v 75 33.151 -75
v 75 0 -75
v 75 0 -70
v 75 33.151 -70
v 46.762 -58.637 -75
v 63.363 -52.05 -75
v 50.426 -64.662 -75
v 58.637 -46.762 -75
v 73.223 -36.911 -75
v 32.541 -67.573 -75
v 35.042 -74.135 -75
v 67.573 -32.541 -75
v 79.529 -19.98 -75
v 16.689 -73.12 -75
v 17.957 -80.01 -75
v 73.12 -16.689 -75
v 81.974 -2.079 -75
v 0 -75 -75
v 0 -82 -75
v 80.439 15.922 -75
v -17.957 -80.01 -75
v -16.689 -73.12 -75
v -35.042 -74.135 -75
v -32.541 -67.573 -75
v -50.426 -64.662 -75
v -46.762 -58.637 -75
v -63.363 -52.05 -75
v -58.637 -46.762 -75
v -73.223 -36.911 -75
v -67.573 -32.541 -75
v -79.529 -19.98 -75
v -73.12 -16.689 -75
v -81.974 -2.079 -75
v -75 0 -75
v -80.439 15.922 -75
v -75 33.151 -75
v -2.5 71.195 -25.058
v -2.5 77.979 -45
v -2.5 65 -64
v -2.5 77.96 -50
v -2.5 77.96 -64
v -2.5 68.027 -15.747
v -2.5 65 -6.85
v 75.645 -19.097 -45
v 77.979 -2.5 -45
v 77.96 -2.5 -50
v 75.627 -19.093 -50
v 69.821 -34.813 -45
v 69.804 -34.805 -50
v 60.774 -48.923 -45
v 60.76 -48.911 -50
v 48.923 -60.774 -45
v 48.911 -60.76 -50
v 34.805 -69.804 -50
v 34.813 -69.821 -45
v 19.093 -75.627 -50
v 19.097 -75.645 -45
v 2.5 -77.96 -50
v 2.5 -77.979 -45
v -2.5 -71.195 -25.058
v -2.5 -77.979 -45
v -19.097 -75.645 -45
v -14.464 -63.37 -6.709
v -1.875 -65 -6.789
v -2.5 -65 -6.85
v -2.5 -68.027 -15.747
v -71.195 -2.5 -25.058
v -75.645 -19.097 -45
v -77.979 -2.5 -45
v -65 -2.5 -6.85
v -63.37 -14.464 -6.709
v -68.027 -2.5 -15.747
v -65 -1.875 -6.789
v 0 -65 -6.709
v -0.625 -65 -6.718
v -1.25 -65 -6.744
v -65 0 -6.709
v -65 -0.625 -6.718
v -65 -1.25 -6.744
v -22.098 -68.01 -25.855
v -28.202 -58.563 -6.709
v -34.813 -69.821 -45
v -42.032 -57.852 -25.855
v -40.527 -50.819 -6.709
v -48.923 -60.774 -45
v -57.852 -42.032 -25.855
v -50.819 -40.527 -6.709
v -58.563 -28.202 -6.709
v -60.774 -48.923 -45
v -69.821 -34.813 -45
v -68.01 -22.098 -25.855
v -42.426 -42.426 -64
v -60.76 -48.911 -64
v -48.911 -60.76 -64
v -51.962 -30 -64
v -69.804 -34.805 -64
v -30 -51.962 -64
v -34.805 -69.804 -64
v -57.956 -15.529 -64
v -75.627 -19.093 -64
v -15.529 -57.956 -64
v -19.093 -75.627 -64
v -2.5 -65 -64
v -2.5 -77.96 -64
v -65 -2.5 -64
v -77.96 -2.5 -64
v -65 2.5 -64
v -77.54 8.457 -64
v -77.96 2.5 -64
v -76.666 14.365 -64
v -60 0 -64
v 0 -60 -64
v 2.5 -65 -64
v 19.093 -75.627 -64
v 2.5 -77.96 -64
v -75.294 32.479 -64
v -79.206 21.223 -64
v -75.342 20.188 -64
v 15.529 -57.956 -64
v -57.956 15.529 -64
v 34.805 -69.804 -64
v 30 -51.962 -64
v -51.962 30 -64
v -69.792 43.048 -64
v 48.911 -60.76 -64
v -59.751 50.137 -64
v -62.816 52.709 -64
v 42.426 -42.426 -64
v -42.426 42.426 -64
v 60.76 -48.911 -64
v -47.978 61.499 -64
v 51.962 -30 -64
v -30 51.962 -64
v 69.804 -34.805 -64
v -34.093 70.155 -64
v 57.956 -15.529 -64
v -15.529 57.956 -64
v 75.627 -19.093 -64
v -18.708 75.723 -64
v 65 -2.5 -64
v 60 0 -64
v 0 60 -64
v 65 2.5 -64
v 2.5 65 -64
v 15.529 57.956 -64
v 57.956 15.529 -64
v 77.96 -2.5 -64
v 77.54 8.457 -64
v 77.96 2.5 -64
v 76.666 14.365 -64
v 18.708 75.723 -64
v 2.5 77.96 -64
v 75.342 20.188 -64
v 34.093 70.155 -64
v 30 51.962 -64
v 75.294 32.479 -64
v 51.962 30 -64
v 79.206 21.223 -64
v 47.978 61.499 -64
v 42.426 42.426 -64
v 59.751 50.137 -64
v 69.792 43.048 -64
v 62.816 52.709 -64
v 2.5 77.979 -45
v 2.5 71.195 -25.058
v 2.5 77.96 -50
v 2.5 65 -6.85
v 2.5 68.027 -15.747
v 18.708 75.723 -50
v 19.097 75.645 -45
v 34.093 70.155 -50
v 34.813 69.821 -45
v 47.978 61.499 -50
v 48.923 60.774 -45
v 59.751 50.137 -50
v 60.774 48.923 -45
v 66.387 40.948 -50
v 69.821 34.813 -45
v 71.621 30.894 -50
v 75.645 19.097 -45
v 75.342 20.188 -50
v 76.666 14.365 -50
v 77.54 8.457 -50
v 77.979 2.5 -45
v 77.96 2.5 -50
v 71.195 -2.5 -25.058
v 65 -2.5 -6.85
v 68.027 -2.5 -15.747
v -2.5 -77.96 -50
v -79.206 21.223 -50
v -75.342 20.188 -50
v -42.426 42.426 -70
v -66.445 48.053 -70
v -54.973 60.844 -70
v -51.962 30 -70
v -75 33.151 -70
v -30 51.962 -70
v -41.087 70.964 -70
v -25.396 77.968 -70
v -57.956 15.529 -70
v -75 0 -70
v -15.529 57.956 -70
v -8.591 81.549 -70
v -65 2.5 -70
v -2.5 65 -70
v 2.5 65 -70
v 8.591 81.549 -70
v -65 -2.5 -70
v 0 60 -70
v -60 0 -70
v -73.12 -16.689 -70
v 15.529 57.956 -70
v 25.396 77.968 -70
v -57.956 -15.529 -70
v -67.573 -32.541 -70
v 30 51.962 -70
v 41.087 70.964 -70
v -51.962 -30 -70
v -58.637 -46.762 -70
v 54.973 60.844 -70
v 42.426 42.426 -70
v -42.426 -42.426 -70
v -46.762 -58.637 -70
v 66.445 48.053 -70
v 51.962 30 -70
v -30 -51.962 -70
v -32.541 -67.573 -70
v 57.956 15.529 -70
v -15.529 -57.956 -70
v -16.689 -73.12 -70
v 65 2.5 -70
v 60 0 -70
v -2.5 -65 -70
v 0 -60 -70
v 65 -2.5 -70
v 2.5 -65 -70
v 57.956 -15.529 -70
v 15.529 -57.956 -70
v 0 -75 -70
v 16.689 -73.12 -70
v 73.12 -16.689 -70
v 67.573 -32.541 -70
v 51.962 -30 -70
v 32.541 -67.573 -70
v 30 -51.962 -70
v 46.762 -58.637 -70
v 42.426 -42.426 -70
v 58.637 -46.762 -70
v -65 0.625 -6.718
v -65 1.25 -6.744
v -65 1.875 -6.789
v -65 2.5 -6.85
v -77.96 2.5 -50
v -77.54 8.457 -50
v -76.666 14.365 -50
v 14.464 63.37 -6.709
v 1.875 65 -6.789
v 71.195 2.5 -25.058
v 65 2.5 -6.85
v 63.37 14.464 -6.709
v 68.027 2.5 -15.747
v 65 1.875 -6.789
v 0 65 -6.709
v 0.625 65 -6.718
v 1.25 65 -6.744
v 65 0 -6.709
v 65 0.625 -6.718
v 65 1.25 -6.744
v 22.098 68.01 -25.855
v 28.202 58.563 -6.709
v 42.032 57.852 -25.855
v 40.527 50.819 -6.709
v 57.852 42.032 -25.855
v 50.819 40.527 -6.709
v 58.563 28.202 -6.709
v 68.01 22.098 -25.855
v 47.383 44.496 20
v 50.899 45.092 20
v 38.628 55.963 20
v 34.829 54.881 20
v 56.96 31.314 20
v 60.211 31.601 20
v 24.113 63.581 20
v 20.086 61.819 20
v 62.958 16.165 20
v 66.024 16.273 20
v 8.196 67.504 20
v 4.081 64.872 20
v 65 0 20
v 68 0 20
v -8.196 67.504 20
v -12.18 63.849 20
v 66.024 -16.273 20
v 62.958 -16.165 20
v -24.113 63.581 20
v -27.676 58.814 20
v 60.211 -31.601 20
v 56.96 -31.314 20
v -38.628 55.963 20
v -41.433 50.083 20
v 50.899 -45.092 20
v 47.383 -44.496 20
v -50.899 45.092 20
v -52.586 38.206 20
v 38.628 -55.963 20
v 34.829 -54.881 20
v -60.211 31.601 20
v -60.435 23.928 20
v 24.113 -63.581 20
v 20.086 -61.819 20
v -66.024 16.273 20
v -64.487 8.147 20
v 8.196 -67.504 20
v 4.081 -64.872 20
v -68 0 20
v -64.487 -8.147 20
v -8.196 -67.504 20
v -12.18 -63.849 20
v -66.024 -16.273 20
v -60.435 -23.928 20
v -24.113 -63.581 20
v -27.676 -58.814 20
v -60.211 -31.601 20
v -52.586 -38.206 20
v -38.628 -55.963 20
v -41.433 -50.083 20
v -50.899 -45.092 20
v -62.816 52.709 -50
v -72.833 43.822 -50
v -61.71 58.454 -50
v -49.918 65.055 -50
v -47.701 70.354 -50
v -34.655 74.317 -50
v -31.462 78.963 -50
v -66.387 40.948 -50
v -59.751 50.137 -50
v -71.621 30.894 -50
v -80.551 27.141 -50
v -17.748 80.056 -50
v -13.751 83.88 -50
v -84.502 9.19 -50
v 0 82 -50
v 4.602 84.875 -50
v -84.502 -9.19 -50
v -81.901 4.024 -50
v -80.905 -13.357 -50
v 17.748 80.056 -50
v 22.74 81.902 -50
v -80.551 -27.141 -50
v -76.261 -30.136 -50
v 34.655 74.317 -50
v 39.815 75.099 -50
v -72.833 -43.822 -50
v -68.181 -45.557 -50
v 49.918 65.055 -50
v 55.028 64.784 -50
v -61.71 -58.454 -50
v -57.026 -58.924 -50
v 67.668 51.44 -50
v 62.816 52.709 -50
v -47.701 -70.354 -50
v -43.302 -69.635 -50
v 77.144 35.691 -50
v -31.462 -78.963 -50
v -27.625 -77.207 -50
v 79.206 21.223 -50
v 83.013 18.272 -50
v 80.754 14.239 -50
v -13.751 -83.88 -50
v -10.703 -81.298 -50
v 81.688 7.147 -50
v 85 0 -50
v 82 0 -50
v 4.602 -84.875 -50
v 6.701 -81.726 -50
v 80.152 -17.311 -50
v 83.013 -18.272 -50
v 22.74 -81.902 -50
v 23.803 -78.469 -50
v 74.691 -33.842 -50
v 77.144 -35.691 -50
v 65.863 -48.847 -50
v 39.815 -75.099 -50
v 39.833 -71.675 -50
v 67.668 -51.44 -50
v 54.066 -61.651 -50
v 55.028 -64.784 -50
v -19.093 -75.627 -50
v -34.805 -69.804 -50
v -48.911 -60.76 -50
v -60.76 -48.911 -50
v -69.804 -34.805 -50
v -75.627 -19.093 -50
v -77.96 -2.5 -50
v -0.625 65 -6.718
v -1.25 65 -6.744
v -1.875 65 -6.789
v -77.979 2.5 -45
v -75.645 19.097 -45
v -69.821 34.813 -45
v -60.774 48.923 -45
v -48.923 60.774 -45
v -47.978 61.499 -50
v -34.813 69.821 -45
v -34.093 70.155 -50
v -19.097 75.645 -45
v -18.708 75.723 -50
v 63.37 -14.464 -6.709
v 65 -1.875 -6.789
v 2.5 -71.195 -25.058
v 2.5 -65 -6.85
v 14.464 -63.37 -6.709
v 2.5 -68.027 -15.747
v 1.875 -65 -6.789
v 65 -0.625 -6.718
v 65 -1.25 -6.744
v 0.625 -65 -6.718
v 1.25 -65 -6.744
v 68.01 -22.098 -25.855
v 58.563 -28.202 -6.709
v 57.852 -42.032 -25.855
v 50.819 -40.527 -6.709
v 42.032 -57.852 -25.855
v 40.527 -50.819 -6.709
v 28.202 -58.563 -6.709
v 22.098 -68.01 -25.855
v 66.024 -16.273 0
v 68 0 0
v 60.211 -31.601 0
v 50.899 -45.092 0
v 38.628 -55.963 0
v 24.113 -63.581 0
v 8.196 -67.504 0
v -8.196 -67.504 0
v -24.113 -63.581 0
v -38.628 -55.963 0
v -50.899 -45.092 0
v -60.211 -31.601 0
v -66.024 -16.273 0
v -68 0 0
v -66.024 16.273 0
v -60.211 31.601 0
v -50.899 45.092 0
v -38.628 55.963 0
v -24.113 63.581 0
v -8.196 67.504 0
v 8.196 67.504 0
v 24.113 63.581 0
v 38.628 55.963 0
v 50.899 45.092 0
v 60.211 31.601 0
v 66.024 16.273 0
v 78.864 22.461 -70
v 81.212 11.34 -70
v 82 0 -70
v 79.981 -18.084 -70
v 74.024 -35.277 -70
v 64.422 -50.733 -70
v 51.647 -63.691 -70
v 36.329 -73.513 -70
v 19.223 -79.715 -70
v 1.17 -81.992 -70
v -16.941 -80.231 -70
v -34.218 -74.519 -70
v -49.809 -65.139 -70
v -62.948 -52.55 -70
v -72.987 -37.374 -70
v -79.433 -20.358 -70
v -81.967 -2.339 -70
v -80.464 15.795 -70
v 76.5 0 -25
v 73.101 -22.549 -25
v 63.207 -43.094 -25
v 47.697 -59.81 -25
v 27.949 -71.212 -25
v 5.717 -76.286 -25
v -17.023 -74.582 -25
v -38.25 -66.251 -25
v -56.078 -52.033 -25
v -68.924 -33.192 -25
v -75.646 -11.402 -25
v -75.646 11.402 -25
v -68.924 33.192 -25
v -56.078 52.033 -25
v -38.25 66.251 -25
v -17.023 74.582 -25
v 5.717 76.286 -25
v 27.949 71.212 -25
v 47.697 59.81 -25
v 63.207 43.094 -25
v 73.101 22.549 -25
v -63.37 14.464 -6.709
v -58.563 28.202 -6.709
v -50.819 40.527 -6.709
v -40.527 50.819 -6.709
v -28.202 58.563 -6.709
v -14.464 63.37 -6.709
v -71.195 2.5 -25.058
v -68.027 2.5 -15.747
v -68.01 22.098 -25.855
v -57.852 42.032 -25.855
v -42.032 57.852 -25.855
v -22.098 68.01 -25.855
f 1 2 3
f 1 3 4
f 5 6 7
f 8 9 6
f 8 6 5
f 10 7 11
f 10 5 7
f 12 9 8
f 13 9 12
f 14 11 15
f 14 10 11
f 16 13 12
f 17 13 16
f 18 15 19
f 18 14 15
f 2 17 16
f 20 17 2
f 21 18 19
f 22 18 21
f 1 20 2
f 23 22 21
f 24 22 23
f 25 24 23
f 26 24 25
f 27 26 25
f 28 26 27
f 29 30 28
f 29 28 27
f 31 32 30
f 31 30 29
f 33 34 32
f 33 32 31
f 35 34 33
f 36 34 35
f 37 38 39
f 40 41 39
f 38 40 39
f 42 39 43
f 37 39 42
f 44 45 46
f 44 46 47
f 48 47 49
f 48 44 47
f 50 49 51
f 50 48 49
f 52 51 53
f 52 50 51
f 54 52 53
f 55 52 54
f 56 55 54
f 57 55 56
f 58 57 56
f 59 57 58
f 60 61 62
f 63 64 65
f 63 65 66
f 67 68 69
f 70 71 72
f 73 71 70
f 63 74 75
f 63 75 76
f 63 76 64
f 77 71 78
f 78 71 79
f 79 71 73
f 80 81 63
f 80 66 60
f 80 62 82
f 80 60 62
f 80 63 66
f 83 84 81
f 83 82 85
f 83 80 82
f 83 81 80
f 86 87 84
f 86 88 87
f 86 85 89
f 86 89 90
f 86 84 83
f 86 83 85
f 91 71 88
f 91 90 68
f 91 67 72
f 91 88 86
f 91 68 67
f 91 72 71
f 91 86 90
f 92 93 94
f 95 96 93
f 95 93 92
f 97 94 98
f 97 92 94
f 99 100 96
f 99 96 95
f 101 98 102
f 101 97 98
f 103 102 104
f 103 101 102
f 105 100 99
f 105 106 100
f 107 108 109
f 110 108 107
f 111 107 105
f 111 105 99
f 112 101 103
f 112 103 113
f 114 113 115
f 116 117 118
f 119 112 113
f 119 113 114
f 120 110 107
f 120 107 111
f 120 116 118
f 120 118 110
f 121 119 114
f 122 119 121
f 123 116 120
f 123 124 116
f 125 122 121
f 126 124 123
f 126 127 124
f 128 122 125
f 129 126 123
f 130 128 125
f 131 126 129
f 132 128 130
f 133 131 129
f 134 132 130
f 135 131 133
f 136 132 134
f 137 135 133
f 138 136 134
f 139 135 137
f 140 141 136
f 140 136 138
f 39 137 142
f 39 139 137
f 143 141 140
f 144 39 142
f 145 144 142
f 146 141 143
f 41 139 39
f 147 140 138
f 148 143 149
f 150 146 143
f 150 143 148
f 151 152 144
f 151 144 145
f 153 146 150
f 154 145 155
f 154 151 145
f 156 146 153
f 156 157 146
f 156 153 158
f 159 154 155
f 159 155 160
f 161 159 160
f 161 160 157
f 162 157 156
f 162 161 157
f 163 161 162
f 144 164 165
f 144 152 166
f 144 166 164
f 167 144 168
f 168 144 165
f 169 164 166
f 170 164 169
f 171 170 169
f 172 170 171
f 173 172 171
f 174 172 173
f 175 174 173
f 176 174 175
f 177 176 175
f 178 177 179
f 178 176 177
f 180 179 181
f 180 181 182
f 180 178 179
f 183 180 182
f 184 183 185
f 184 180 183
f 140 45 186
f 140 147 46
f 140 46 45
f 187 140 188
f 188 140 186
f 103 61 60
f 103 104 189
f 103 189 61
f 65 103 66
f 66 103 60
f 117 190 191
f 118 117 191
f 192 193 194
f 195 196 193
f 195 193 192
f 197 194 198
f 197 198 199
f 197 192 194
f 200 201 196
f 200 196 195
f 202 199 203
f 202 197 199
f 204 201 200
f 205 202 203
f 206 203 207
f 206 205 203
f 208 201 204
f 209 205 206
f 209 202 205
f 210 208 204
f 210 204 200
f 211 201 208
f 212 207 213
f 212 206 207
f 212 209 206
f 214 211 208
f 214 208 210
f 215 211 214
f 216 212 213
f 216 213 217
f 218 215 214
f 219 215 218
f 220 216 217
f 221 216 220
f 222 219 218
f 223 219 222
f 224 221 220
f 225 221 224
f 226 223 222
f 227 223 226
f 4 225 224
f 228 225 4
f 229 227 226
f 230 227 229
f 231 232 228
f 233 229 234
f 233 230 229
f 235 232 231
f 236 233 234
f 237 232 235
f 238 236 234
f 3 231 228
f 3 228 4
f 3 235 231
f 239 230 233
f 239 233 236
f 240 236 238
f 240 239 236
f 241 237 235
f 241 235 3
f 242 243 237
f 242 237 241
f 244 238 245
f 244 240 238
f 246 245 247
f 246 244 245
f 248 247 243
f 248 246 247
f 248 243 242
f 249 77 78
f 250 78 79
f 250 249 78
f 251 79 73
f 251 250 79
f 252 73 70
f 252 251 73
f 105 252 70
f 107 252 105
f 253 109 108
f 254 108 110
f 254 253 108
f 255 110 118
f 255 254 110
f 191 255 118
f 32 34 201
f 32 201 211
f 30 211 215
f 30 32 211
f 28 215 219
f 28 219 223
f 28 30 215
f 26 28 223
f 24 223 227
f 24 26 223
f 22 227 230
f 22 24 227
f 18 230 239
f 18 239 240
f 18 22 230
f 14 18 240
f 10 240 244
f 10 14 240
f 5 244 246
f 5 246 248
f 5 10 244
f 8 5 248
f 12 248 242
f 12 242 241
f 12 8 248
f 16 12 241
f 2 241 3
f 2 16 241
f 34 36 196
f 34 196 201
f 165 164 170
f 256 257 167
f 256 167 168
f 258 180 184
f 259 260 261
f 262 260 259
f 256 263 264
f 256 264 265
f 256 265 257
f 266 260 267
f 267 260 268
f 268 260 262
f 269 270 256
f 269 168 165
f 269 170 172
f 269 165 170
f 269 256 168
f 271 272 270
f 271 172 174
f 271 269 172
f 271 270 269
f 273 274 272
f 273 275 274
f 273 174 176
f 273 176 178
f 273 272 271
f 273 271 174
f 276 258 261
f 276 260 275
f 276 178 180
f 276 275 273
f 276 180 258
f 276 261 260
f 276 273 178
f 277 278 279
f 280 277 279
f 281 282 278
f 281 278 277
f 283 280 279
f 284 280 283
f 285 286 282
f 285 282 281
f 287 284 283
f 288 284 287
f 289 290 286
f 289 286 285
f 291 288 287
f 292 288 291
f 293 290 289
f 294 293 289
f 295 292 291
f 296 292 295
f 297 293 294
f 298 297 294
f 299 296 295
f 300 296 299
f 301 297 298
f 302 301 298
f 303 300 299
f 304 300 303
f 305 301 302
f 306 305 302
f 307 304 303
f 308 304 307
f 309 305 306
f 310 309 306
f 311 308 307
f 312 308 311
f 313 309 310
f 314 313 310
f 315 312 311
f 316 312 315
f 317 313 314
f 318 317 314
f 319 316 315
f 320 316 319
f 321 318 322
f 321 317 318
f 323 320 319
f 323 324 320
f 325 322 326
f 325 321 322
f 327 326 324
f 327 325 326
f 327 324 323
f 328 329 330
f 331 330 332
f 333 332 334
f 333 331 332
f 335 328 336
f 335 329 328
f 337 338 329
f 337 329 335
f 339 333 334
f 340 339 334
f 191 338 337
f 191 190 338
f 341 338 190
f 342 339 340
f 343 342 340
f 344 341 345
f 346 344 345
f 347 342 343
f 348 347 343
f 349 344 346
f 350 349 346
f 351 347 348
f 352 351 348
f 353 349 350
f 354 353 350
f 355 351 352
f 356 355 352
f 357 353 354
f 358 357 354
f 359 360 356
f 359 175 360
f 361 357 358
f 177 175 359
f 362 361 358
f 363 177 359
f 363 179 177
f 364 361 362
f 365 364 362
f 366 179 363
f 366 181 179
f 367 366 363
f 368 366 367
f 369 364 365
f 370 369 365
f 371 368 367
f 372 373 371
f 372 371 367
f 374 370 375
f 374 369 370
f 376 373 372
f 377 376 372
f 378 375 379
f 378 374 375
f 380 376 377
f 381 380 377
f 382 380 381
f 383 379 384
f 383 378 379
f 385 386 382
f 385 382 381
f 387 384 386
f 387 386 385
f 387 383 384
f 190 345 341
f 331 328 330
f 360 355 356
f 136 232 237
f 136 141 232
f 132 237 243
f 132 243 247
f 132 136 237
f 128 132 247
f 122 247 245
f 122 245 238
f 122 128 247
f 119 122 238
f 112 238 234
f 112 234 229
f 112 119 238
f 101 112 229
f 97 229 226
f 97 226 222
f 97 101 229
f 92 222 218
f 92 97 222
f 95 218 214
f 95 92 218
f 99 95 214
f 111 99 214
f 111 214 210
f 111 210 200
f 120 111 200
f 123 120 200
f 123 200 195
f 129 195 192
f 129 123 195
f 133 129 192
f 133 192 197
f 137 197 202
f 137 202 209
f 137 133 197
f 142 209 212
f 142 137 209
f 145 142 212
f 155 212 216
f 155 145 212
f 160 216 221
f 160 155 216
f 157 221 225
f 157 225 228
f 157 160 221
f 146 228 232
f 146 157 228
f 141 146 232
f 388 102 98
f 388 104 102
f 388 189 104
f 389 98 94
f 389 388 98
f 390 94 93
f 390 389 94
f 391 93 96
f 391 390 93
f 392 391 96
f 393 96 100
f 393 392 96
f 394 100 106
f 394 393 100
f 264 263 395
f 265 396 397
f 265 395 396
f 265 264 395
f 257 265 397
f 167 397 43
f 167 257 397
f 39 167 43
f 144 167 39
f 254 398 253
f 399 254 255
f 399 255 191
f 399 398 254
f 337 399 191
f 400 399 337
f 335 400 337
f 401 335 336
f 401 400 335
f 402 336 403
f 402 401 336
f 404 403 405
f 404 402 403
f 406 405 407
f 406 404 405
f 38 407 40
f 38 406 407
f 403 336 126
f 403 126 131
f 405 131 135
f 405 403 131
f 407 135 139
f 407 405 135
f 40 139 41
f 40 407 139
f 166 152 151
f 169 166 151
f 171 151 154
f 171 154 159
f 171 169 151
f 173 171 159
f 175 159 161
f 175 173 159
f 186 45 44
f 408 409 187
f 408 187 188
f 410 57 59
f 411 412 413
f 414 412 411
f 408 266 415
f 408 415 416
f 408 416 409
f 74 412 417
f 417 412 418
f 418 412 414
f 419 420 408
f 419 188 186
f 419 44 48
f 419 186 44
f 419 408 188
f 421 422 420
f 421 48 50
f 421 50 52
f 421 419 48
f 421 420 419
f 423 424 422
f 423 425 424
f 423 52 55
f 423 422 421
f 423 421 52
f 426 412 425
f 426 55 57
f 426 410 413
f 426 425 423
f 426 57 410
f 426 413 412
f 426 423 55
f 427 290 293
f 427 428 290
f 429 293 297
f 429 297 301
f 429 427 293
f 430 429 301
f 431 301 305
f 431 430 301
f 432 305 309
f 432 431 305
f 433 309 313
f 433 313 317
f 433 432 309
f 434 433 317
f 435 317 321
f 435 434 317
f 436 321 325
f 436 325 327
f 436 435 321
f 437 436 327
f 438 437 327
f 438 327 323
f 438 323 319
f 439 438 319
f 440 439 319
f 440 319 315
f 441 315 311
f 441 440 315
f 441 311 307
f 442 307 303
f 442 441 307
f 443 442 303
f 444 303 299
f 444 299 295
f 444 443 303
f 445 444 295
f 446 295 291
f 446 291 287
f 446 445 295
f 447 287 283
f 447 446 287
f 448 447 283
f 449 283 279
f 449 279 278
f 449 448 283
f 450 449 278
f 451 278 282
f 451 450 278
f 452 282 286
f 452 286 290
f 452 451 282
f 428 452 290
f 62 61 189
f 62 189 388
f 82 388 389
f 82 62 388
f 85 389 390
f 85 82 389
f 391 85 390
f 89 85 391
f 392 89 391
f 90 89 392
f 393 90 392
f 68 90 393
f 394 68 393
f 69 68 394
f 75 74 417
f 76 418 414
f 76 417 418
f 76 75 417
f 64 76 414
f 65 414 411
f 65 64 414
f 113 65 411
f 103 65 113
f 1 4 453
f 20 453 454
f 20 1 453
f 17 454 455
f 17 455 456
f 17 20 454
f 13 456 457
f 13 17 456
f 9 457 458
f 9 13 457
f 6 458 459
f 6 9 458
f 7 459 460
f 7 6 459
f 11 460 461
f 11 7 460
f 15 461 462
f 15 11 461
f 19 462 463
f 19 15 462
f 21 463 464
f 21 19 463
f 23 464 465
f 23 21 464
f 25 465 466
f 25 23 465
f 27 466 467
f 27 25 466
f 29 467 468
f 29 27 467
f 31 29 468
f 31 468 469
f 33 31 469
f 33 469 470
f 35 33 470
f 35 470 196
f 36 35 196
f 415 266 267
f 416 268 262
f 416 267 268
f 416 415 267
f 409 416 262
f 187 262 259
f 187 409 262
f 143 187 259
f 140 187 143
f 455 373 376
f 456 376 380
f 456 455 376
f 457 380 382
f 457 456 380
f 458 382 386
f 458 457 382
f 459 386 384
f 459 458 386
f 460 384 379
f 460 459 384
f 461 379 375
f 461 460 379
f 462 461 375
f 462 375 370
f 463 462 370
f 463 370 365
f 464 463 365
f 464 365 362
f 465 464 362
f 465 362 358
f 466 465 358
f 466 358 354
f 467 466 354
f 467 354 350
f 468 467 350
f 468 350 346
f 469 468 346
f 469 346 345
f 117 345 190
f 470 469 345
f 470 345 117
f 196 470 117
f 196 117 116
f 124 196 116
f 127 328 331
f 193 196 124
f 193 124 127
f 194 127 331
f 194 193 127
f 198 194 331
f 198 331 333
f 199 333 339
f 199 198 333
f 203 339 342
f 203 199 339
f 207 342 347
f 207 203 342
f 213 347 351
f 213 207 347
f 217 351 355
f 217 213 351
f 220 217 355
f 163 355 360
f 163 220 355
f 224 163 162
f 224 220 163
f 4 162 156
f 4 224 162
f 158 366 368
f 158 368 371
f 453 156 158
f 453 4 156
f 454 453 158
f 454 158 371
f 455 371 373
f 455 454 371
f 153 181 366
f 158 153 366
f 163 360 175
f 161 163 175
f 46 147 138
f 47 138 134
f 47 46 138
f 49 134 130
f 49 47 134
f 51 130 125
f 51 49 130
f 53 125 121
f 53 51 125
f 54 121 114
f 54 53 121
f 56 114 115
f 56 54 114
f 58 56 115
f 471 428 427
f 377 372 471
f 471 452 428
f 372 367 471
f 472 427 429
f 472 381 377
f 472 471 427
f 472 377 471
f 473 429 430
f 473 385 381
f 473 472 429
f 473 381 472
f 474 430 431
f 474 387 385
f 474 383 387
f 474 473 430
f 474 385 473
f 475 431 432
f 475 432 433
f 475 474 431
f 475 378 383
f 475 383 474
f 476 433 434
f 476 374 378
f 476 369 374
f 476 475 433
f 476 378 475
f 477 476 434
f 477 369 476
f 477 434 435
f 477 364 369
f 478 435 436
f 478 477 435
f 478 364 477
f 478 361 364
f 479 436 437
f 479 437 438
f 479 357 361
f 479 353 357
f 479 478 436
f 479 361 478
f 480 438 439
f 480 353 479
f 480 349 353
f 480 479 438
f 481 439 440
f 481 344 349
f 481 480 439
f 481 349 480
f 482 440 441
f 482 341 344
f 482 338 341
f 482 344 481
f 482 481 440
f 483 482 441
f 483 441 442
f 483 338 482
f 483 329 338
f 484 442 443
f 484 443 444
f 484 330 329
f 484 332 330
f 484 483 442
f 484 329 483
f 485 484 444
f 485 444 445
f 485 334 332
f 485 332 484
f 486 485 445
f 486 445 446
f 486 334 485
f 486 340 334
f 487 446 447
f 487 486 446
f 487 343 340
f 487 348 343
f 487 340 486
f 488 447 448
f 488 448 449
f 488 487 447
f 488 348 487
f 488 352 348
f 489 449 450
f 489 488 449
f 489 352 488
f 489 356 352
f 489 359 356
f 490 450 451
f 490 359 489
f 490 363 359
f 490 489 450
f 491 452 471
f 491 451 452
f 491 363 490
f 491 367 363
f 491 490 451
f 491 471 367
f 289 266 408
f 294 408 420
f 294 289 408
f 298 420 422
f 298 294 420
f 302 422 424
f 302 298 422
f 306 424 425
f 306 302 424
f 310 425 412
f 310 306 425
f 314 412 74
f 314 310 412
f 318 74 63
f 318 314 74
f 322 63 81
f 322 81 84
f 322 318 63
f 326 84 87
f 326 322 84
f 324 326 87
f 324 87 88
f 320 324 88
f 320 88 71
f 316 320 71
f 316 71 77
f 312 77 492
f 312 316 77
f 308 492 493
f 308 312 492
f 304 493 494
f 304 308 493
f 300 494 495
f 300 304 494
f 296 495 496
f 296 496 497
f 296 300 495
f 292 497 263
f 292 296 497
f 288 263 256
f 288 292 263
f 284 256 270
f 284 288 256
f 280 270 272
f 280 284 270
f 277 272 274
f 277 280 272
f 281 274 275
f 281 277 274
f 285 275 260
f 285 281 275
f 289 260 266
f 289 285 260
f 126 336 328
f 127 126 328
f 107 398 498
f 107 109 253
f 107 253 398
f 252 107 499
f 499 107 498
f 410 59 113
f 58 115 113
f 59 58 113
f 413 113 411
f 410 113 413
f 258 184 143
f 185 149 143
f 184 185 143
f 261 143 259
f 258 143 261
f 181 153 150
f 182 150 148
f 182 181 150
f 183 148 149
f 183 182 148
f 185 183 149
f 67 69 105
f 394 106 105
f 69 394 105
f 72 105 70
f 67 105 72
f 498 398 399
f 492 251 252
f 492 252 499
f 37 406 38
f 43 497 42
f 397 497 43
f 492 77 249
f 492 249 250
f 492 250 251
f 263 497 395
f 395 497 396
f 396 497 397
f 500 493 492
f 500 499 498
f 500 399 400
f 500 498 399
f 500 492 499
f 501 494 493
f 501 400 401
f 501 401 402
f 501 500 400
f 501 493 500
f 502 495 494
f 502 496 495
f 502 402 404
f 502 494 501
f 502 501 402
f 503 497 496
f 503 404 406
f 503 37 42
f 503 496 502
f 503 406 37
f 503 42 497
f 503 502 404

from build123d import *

# Parameters (mm, degrees)
CUT_EXTRUDE7_DEPTH   = 14
BOSS_EXTRUDE10_START = 5
BOSS_EXTRUDE10_DEPTH = 5
BOSS_EXTRUDE11_DEPTH = 2.5
CIRPATTERN1_COUNT    = 4


with BuildPart() as part:
    # Sketch10 → Revolve2 (revolve)
    with BuildSketch(Plane(origin=(0, 0, 0), x_dir=(1, 0, 0), z_dir=(0, 1, 0))):
        Polygon((68, 0), (85, 50), (82, 50), (82, 70), (60, 70), (60, 64), (78, 64), (78, 50), (78.018901629, 45), (65, 6.709112855), (65, -20), (68, -20), align=None)
    revolve(axis=Axis((0, 0, 0), (0, 0, -1)))

    # Sketch19 → Cut-Extrude7 (cut)
    with BuildSketch(Plane(origin=(0, 0, -50), x_dir=(-1, 0, 0), z_dir=(0, 0, -1))):
        with BuildLine():
            Line((-75.342214451, 20.187885518), (-79.205917756, 21.223161698))
            ThreePointArc((-79.205917756, 21.223161698), (-72.734888321, 37.863386285), (-62.815644336, 52.708583994))
            Line((-62.815644336, 52.708583994), (-59.751466563, 50.137433556))
            ThreePointArc((-59.751466563, 50.137433556), (-69.186844988, 36.016391832), (-75.342214451, 20.187885518))
        make_face()
        with BuildLine():
            Line((59.751466563, 50.137433556), (62.815644336, 52.708583994))
            ThreePointArc((62.815644336, 52.708583994), (72.734888321, 37.863386285), (79.205917756, 21.223161698))
            Line((79.205917756, 21.223161698), (75.342214451, 20.187885518))
            ThreePointArc((75.342214451, 20.187885518), (69.186844988, 36.016391832), (59.751466563, 50.137433556))
        make_face()
    extrude(amount=CUT_EXTRUDE7_DEPTH, mode=Mode.SUBTRACT)

    # Sketch29 → Boss-Extrude10 (add)
    with BuildSketch(Plane(origin=(0, 0, -70), x_dir=(-1, 0, 0), z_dir=(0, 0, -1)).offset(BOSS_EXTRUDE10_START)):
        with BuildLine():
            Line((-75, 0), (-75, 33.151168909))
            ThreePointArc((-75, 33.151168909), (0, -82), (75, 33.151168909))
            Line((75, 33.151168909), (75, 0))
            ThreePointArc((75, 0), (0, -75), (-75, 0))
        make_face()
    extrude(amount=-BOSS_EXTRUDE10_DEPTH)

    # Sketch37 → Boss-Extrude11 (add, symmetric)
    with BuildSketch(Plane(origin=(0, 0, 0), x_dir=(1, 0, 0), z_dir=(0, 1, 0))):
        Polygon((-65, 6.709112855), (-65, 70), (-78, 64), (-78.018901629, 45), align=None)
    boss_extrude11 = extrude(amount=BOSS_EXTRUDE11_DEPTH, both=True)

    # CirPattern1: Boss-Extrude11 ×4 about axis
    cirpattern1_axis = Axis((0, 0, 0), (0, 0, 1))
    for i in range(1, CIRPATTERN1_COUNT):
        add(boss_extrude11.rotate(cirpattern1_axis, i * 360 / CIRPATTERN1_COUNT))


solid = part.part
